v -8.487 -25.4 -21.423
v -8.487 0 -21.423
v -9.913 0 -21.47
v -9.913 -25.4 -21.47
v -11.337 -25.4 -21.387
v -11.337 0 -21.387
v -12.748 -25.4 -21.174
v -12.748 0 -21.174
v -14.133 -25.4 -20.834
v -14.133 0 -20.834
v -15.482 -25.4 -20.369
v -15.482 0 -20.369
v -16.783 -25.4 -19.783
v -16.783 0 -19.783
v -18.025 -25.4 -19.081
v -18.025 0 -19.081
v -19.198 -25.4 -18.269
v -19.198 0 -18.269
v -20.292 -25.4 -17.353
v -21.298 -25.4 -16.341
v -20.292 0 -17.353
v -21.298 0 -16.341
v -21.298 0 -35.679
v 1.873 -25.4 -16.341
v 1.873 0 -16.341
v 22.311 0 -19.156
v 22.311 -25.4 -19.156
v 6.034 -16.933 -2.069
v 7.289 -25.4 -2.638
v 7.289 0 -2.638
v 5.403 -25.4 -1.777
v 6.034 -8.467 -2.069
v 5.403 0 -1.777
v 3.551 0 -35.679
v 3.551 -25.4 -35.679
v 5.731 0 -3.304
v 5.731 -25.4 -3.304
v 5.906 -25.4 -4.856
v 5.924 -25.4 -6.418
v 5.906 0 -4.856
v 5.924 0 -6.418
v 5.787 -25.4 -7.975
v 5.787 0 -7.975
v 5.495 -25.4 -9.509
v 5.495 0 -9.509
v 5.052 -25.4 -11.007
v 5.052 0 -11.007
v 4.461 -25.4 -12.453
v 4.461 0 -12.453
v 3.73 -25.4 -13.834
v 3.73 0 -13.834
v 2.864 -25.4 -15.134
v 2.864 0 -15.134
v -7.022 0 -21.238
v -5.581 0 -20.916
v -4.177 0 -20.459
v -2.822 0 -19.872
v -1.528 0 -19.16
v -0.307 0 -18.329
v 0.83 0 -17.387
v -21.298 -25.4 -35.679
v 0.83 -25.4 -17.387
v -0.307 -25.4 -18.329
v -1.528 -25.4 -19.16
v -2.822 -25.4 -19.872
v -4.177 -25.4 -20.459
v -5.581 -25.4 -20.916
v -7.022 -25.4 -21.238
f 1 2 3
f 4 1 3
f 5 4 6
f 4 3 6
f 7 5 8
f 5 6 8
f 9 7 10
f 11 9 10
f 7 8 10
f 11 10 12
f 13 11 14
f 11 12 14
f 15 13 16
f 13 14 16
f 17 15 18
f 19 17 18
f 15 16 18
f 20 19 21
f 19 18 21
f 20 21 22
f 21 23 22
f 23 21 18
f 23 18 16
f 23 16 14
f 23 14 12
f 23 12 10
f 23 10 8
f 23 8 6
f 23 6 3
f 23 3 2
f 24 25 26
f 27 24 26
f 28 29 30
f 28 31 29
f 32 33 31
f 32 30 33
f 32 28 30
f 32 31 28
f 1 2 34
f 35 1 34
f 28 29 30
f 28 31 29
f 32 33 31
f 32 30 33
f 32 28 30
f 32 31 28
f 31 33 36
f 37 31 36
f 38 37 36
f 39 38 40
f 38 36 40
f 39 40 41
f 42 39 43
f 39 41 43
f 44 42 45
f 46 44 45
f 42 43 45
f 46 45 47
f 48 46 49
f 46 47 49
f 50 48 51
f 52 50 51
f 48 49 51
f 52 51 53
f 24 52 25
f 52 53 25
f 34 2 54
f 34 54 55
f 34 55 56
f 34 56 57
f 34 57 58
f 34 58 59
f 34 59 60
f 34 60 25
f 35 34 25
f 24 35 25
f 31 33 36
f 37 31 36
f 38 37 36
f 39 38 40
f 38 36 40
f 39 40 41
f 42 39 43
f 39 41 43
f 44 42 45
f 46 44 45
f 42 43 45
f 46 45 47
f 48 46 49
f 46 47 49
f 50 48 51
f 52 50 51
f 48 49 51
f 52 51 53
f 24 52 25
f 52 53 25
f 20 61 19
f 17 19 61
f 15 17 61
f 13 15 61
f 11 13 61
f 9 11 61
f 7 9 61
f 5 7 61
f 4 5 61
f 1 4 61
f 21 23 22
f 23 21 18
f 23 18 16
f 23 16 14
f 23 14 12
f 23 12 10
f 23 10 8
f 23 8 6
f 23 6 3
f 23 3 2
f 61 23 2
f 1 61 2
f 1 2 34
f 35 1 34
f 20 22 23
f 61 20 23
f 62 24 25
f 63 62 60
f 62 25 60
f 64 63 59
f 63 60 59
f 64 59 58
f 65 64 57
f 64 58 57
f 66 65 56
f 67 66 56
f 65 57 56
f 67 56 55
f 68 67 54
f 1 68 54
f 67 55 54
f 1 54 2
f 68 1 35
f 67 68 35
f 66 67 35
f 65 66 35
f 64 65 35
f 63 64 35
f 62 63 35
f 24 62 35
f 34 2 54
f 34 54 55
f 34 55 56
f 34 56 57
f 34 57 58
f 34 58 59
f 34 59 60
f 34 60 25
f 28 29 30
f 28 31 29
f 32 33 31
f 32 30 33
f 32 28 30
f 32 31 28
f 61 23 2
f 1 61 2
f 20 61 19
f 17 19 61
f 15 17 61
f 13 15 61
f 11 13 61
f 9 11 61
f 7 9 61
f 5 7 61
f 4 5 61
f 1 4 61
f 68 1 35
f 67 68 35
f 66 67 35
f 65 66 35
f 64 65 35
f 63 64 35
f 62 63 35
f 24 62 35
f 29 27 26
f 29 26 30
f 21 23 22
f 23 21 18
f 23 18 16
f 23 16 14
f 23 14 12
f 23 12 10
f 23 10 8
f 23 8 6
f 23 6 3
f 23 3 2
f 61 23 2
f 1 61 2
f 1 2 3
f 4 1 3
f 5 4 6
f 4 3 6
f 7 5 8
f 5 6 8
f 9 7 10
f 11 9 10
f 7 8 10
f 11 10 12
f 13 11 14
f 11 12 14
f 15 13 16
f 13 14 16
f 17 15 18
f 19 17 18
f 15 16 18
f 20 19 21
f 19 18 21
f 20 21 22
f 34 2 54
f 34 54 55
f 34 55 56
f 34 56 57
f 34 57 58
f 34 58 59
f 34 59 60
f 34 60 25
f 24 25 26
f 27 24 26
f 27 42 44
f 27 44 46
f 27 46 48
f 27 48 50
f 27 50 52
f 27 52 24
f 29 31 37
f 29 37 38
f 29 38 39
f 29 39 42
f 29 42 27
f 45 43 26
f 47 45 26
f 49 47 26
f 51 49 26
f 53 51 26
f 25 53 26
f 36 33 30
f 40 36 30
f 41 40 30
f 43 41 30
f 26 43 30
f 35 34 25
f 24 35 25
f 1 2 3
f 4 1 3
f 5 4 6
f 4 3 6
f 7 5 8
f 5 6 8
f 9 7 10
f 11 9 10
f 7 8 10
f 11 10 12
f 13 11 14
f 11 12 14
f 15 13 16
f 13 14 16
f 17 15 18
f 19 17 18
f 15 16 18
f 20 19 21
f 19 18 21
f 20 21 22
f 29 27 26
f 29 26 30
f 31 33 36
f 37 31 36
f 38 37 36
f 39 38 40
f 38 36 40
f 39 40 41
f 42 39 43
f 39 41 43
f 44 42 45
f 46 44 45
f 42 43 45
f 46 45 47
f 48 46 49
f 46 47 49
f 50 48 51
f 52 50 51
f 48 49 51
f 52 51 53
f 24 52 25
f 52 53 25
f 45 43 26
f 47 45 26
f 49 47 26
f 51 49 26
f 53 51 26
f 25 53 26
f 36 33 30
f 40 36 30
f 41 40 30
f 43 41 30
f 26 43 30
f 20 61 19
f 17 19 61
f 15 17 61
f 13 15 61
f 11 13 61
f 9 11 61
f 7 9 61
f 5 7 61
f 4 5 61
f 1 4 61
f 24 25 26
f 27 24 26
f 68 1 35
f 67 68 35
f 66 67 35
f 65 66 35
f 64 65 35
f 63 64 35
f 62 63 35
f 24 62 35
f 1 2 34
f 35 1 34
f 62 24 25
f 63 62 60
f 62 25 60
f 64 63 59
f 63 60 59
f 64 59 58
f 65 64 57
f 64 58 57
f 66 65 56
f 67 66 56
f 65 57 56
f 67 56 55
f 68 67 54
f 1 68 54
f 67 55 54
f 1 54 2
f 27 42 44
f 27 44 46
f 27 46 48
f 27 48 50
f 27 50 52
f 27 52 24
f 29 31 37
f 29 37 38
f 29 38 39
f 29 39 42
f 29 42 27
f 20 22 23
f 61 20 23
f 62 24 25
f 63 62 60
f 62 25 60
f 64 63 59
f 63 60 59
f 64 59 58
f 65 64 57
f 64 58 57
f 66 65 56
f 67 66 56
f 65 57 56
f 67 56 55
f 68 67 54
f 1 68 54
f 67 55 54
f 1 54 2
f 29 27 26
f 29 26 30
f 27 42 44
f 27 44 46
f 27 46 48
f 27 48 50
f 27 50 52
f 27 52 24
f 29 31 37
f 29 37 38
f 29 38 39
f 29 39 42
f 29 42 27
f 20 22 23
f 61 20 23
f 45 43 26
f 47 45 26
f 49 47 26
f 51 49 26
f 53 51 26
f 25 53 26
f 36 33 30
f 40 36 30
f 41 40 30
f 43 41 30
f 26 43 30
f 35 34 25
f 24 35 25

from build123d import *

# Parameters (mm, degrees)
F2_DEPTH = 25.4
F3_DEPTH = 25.4
F4_DEPTH = 25.4


# Not quite as in the source:
# - the program builds the solid bodies; features that only make, move or delete a surface that nothing else refers to are left out


with BuildPart() as f2:
    # F0 (on Front) → F2 (new body)
    with BuildSketch(Plane.XZ):
        with BuildLine():
            Line((-21.2980724055, -35.6793105602), (-8.4871734768, -21.4231418318))
            ThreePointArc((-8.4871734768, -21.4231418318), (-15.4822035317, -20.368652553), (-21.2980724055, -16.3414870052))
            Line((-21.2980724055, -16.3414870052), (-21.2980724055, -35.6793105602))
        make_face()
    extrude(amount=F2_DEPTH)


with BuildPart() as f2b:
    # F0 (on Front) → F2, piece 2 (new body)
    with BuildSketch(Plane.XZ):
        with BuildLine():
            Line((3.5508128349, -35.6793105602), (1.8730703471, -16.3414870052))
            ThreePointArc((1.8730703471, -16.3414870052), (-2.8215223771, -19.8721889655), (-8.4871734768, -21.4231418318))
            Line((-8.4871734768, -21.4231418318), (3.5508128349, -35.6793105602))
        make_face()
    extrude(amount=F2_DEPTH)


with BuildPart() as f2c:
    # F0 (on Front) → F2, piece 3 (new body)
    with BuildSketch(Plane.XZ):
        with BuildLine():
            Line((22.3111603409, -19.156107679), (7.2886282847, -2.6376740133))
            add(Edge.make_bspline(
                [(5.4032869201, -1.7767953694), (6.0356572868, -2.0719724376), (6.6644062734, -2.3594052932), (7.2886282847, -2.6376740133)],
                knots=[0.0868033089, 0.0868033089, 0.0868033089, 0.0868033089, 0.0947225706, 0.0947225706, 0.0947225706, 0.0947225706], degree=3))
            ThreePointArc((5.4032869201, -1.7767953694), (5.4951683541, -9.5092417491), (1.8730703471, -16.3414870052))
            Line((1.8730703471, -16.3414870052), (22.3111603409, -19.156107679))
        make_face()
    extrude(amount=F2_DEPTH)


with BuildPart() as f3:
    # F0 (on Front) → F3 (new body)
    with BuildSketch(Plane.XZ):
        with BuildLine():
            Line((-21.2980724055, -35.6793105602), (-8.4871734768, -21.4231418318))
            ThreePointArc((-8.4871734768, -21.4231418318), (-15.4822035317, -20.368652553), (-21.2980724055, -16.3414870052))
            Line((-21.2980724055, -16.3414870052), (-21.2980724055, -35.6793105602))
        make_face()
    extrude(amount=F3_DEPTH)


with BuildPart() as f3b:
    # F0 (on Front) → F3, piece 2 (new body)
    with BuildSketch(Plane.XZ):
        with BuildLine():
            Line((3.5508128349, -35.6793105602), (1.8730703471, -16.3414870052))
            ThreePointArc((1.8730703471, -16.3414870052), (-2.8215223771, -19.8721889655), (-8.4871734768, -21.4231418318))
            Line((-8.4871734768, -21.4231418318), (3.5508128349, -35.6793105602))
        make_face()
    extrude(amount=F3_DEPTH)


with BuildPart() as f3c:
    # F0 (on Front) → F3, piece 3 (new body)
    with BuildSketch(Plane.XZ):
        with BuildLine():
            Line((22.3111603409, -19.156107679), (7.2886282847, -2.6376740133))
            add(Edge.make_bspline(
                [(5.4032869201, -1.7767953694), (6.0356572868, -2.0719724376), (6.6644062734, -2.3594052932), (7.2886282847, -2.6376740133)],
                knots=[0.0868033089, 0.0868033089, 0.0868033089, 0.0868033089, 0.0947225706, 0.0947225706, 0.0947225706, 0.0947225706], degree=3))
            ThreePointArc((5.4032869201, -1.7767953694), (5.4951683541, -9.5092417491), (1.8730703471, -16.3414870052))
            Line((1.8730703471, -16.3414870052), (22.3111603409, -19.156107679))
        make_face()
    extrude(amount=F3_DEPTH)


with BuildPart() as f4:
    # F0 (on Front) → F4 (new body)
    with BuildSketch(Plane.XZ):
        with BuildLine():
            Line((-21.2980724055, -35.6793105602), (-8.4871734768, -21.4231418318))
            ThreePointArc((-8.4871734768, -21.4231418318), (-15.4822035317, -20.368652553), (-21.2980724055, -16.3414870052))
            Line((-21.2980724055, -16.3414870052), (-21.2980724055, -35.6793105602))
        make_face()
    extrude(amount=F4_DEPTH)


with BuildPart() as f4b:
    # F0 (on Front) → F4, piece 2 (new body)
    with BuildSketch(Plane.XZ):
        with BuildLine():
            Line((3.5508128349, -35.6793105602), (1.8730703471, -16.3414870052))
            ThreePointArc((1.8730703471, -16.3414870052), (-2.8215223771, -19.8721889655), (-8.4871734768, -21.4231418318))
            Line((-8.4871734768, -21.4231418318), (3.5508128349, -35.6793105602))
        make_face()
    extrude(amount=F4_DEPTH)


with BuildPart() as f4c:
    # F0 (on Front) → F4, piece 3 (new body)
    with BuildSketch(Plane.XZ):
        with BuildLine():
            Line((22.3111603409, -19.156107679), (7.2886282847, -2.6376740133))
            add(Edge.make_bspline(
                [(5.4032869201, -1.7767953694), (6.0356572868, -2.0719724376), (6.6644062734, -2.3594052932), (7.2886282847, -2.6376740133)],
                knots=[0.0868033089, 0.0868033089, 0.0868033089, 0.0868033089, 0.0947225706, 0.0947225706, 0.0947225706, 0.0947225706], degree=3))
            ThreePointArc((5.4032869201, -1.7767953694), (5.4951683541, -9.5092417491), (1.8730703471, -16.3414870052))
            Line((1.8730703471, -16.3414870052), (22.3111603409, -19.156107679))
        make_face()
    extrude(amount=F4_DEPTH)


solid = Compound([f2.part, f2b.part, f2c.part, f3.part, f3b.part, f3c.part, f4.part, f4b.part, f4c.part])
